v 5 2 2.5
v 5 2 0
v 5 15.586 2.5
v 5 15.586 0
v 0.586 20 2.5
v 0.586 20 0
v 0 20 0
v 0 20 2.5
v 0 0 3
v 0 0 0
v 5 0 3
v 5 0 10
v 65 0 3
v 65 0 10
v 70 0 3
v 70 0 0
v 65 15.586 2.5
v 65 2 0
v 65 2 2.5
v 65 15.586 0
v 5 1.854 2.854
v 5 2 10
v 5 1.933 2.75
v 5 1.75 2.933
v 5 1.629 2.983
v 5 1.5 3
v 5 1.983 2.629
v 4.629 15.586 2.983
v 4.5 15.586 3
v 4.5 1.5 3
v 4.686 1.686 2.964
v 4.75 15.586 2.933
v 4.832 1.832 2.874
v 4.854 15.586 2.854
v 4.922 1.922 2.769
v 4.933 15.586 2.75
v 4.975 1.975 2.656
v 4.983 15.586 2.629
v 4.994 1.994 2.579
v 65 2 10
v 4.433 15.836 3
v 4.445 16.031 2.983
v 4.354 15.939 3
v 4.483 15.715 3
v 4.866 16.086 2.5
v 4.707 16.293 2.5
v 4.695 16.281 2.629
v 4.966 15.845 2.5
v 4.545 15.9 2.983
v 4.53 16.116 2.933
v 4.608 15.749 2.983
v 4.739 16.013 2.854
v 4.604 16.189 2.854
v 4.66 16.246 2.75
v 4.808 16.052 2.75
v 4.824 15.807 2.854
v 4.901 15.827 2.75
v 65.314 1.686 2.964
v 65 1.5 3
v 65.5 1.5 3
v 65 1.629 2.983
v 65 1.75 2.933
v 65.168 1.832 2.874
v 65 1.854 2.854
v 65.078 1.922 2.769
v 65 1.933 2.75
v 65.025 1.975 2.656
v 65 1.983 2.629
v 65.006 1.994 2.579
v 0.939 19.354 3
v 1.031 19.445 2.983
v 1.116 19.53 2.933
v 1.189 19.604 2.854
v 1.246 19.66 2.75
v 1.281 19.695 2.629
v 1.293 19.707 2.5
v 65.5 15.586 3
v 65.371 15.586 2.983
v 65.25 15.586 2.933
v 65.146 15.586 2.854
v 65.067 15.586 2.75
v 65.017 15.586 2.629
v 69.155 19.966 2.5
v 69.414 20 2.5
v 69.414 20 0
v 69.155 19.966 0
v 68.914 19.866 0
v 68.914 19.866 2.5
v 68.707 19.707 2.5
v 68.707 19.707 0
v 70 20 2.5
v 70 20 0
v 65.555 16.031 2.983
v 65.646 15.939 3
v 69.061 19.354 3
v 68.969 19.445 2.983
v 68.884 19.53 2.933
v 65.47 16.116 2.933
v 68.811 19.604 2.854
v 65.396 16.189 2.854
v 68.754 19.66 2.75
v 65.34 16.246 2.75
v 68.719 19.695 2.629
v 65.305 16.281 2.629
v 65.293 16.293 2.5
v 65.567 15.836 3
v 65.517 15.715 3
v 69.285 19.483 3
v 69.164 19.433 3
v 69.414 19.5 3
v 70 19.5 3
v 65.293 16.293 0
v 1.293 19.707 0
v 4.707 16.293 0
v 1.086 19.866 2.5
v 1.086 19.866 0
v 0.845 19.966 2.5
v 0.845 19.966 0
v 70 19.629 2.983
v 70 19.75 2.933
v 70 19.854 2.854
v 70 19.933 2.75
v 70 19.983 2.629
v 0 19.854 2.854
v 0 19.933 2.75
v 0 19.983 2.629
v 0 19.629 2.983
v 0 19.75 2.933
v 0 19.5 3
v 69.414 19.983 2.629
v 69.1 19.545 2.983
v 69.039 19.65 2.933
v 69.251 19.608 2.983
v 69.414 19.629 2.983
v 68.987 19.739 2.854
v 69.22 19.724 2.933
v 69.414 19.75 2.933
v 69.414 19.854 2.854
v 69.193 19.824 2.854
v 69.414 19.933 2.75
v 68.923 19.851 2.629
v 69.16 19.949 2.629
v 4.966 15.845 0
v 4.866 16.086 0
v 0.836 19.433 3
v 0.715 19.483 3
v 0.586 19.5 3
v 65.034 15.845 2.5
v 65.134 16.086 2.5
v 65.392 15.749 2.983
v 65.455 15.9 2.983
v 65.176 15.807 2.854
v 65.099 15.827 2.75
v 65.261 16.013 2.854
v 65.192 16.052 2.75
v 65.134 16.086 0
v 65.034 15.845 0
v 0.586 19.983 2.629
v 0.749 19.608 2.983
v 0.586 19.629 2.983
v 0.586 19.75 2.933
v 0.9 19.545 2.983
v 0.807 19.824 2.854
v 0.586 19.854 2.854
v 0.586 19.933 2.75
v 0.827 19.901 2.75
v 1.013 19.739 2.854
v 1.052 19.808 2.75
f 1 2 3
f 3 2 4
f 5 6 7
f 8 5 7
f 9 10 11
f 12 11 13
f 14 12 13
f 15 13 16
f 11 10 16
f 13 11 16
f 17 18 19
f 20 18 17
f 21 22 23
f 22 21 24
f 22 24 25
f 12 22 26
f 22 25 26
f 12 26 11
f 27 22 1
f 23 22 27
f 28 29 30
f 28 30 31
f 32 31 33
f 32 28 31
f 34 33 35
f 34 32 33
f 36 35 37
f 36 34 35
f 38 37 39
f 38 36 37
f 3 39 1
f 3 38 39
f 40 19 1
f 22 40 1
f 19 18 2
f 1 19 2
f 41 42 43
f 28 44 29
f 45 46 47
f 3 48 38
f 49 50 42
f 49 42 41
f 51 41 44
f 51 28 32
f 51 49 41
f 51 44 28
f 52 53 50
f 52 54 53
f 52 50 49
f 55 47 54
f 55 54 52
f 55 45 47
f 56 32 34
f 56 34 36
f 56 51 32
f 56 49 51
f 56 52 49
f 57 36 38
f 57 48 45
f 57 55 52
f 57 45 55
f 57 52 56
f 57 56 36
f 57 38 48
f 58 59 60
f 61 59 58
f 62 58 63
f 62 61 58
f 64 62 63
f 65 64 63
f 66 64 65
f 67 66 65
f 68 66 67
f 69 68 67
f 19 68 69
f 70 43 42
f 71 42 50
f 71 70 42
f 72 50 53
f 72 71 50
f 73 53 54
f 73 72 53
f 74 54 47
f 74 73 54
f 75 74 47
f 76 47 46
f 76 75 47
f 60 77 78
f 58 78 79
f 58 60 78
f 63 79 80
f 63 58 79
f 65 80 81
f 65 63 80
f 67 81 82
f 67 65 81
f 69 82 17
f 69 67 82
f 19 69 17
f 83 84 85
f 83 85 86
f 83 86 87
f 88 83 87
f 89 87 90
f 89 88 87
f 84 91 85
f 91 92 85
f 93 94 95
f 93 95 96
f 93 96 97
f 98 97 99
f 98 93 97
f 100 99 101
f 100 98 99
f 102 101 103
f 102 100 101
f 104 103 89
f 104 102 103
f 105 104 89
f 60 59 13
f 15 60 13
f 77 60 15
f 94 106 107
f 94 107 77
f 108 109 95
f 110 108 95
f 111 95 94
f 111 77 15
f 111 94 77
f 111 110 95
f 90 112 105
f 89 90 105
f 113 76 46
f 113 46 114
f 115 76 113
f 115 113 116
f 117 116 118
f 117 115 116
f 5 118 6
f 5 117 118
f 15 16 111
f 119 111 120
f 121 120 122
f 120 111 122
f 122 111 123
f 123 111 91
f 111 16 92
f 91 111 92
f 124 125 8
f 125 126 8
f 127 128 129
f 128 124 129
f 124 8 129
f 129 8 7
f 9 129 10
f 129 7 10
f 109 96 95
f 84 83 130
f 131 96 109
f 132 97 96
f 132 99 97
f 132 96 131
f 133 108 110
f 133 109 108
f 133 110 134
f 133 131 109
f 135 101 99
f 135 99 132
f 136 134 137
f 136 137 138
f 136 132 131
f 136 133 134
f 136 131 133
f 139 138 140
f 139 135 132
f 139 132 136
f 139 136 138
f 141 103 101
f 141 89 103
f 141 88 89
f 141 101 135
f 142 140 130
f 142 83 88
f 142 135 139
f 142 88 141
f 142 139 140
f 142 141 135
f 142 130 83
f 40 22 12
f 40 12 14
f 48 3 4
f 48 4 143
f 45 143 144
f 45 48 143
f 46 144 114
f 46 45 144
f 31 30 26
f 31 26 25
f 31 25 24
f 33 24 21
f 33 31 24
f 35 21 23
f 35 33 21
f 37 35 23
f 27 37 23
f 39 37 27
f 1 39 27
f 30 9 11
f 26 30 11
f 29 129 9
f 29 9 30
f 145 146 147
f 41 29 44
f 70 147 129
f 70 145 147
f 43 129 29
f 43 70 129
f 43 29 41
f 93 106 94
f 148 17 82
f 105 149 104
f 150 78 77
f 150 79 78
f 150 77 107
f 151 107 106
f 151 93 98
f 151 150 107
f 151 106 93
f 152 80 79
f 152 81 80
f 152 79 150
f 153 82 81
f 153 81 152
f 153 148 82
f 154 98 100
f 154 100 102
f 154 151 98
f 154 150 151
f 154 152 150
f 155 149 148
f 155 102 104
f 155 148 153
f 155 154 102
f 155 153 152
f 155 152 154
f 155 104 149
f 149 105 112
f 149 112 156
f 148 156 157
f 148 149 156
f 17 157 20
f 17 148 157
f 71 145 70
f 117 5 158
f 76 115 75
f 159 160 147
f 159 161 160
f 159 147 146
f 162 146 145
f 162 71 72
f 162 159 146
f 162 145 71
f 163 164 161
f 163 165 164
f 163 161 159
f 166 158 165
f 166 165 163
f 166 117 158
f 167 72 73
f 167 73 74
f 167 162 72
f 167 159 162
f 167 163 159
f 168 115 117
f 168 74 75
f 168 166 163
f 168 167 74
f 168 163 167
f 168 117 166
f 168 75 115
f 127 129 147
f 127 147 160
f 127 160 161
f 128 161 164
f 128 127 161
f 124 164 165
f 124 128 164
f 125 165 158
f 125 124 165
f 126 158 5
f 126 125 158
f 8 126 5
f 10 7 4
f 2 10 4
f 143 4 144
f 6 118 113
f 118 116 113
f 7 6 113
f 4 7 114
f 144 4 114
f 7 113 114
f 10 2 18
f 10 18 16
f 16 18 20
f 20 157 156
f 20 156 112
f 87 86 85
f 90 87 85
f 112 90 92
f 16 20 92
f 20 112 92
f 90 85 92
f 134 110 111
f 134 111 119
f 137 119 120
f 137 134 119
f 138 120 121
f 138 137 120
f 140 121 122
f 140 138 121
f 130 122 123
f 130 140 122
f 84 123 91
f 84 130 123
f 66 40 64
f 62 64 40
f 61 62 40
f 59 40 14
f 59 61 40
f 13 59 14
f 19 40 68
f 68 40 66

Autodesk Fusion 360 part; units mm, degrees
sketch "Sketch1" plane through (0, 0, 0) normal (0, 0, 1) x (1, 0, 0)
  line L0 (0, 0) -> (70, 0)
  line L1 (70, 0) -> (70, 20)
  line L2 (70, 20) -> (0, 20)
  line L3 (0, 20) -> (0, 0)
  line L4 (35, 0) -> (35, 2)
  line L5 (35, 2) -> (5, 2)
  line L6 (5, 2) -> (5, 20)
  line L7 (65, 2) -> (65, 20)
  line L8 (35, 2) -> (65, 2)
  line L9 (5, 2) -> (5, 0)
  line L10 (65, 2) -> (65, 0)
  dimension "d2" = 70
  dimension "d3" = 20
  dimension "d5" = 2
  dimension "d6" = 30
extrude "Extrude1" add sketch "Sketch1" along normal blind 3 contours L0 L2 L3 L6 L9 | L0 L4 L5 L9 | L0 L4 L8 L10 | L0 L1 L2 L7 L10
chamfer "Chamfer1" distance 4 distance2 4 1 edges at (65, 20, 1.5) measured on face at (68.3333, 20, 1)
chamfer "Chamfer1" distance 4 distance2 4 1 edges at (5, 20, 1.5) measured on face at (5, 8, 1)
fillet "Fillet1" radius 1 4 edges at (5, 16, 1.5) (1, 20, 1.5) (65, 16, 1.5) (69, 20, 1.5)
fillet "Fillet2" radius 0.5 9 edges at (35, 2, 3) (69.0315, 19.9239, 3) (67, 18, 3) (65.0761, 15.9685, 3) (65, 8.7929, 3) (5, 8.7929, 3) (4.9239, 15.9685, 3) (3, 18, 3) (0.9685, 19.9239, 3)
extrude "Extrude2" add sketch "Sketch1" along normal blind 10 contours L0 L4 L5 L9 | L0 L4 L8 L10
equation "box_width = 70 mm"
equation "d2 = box_width"
equation "d3 = box_len"
equation "cover_width = 60 mm"
equation "d6 = cover_width / 2"
equation "box_len = 20 mm"
